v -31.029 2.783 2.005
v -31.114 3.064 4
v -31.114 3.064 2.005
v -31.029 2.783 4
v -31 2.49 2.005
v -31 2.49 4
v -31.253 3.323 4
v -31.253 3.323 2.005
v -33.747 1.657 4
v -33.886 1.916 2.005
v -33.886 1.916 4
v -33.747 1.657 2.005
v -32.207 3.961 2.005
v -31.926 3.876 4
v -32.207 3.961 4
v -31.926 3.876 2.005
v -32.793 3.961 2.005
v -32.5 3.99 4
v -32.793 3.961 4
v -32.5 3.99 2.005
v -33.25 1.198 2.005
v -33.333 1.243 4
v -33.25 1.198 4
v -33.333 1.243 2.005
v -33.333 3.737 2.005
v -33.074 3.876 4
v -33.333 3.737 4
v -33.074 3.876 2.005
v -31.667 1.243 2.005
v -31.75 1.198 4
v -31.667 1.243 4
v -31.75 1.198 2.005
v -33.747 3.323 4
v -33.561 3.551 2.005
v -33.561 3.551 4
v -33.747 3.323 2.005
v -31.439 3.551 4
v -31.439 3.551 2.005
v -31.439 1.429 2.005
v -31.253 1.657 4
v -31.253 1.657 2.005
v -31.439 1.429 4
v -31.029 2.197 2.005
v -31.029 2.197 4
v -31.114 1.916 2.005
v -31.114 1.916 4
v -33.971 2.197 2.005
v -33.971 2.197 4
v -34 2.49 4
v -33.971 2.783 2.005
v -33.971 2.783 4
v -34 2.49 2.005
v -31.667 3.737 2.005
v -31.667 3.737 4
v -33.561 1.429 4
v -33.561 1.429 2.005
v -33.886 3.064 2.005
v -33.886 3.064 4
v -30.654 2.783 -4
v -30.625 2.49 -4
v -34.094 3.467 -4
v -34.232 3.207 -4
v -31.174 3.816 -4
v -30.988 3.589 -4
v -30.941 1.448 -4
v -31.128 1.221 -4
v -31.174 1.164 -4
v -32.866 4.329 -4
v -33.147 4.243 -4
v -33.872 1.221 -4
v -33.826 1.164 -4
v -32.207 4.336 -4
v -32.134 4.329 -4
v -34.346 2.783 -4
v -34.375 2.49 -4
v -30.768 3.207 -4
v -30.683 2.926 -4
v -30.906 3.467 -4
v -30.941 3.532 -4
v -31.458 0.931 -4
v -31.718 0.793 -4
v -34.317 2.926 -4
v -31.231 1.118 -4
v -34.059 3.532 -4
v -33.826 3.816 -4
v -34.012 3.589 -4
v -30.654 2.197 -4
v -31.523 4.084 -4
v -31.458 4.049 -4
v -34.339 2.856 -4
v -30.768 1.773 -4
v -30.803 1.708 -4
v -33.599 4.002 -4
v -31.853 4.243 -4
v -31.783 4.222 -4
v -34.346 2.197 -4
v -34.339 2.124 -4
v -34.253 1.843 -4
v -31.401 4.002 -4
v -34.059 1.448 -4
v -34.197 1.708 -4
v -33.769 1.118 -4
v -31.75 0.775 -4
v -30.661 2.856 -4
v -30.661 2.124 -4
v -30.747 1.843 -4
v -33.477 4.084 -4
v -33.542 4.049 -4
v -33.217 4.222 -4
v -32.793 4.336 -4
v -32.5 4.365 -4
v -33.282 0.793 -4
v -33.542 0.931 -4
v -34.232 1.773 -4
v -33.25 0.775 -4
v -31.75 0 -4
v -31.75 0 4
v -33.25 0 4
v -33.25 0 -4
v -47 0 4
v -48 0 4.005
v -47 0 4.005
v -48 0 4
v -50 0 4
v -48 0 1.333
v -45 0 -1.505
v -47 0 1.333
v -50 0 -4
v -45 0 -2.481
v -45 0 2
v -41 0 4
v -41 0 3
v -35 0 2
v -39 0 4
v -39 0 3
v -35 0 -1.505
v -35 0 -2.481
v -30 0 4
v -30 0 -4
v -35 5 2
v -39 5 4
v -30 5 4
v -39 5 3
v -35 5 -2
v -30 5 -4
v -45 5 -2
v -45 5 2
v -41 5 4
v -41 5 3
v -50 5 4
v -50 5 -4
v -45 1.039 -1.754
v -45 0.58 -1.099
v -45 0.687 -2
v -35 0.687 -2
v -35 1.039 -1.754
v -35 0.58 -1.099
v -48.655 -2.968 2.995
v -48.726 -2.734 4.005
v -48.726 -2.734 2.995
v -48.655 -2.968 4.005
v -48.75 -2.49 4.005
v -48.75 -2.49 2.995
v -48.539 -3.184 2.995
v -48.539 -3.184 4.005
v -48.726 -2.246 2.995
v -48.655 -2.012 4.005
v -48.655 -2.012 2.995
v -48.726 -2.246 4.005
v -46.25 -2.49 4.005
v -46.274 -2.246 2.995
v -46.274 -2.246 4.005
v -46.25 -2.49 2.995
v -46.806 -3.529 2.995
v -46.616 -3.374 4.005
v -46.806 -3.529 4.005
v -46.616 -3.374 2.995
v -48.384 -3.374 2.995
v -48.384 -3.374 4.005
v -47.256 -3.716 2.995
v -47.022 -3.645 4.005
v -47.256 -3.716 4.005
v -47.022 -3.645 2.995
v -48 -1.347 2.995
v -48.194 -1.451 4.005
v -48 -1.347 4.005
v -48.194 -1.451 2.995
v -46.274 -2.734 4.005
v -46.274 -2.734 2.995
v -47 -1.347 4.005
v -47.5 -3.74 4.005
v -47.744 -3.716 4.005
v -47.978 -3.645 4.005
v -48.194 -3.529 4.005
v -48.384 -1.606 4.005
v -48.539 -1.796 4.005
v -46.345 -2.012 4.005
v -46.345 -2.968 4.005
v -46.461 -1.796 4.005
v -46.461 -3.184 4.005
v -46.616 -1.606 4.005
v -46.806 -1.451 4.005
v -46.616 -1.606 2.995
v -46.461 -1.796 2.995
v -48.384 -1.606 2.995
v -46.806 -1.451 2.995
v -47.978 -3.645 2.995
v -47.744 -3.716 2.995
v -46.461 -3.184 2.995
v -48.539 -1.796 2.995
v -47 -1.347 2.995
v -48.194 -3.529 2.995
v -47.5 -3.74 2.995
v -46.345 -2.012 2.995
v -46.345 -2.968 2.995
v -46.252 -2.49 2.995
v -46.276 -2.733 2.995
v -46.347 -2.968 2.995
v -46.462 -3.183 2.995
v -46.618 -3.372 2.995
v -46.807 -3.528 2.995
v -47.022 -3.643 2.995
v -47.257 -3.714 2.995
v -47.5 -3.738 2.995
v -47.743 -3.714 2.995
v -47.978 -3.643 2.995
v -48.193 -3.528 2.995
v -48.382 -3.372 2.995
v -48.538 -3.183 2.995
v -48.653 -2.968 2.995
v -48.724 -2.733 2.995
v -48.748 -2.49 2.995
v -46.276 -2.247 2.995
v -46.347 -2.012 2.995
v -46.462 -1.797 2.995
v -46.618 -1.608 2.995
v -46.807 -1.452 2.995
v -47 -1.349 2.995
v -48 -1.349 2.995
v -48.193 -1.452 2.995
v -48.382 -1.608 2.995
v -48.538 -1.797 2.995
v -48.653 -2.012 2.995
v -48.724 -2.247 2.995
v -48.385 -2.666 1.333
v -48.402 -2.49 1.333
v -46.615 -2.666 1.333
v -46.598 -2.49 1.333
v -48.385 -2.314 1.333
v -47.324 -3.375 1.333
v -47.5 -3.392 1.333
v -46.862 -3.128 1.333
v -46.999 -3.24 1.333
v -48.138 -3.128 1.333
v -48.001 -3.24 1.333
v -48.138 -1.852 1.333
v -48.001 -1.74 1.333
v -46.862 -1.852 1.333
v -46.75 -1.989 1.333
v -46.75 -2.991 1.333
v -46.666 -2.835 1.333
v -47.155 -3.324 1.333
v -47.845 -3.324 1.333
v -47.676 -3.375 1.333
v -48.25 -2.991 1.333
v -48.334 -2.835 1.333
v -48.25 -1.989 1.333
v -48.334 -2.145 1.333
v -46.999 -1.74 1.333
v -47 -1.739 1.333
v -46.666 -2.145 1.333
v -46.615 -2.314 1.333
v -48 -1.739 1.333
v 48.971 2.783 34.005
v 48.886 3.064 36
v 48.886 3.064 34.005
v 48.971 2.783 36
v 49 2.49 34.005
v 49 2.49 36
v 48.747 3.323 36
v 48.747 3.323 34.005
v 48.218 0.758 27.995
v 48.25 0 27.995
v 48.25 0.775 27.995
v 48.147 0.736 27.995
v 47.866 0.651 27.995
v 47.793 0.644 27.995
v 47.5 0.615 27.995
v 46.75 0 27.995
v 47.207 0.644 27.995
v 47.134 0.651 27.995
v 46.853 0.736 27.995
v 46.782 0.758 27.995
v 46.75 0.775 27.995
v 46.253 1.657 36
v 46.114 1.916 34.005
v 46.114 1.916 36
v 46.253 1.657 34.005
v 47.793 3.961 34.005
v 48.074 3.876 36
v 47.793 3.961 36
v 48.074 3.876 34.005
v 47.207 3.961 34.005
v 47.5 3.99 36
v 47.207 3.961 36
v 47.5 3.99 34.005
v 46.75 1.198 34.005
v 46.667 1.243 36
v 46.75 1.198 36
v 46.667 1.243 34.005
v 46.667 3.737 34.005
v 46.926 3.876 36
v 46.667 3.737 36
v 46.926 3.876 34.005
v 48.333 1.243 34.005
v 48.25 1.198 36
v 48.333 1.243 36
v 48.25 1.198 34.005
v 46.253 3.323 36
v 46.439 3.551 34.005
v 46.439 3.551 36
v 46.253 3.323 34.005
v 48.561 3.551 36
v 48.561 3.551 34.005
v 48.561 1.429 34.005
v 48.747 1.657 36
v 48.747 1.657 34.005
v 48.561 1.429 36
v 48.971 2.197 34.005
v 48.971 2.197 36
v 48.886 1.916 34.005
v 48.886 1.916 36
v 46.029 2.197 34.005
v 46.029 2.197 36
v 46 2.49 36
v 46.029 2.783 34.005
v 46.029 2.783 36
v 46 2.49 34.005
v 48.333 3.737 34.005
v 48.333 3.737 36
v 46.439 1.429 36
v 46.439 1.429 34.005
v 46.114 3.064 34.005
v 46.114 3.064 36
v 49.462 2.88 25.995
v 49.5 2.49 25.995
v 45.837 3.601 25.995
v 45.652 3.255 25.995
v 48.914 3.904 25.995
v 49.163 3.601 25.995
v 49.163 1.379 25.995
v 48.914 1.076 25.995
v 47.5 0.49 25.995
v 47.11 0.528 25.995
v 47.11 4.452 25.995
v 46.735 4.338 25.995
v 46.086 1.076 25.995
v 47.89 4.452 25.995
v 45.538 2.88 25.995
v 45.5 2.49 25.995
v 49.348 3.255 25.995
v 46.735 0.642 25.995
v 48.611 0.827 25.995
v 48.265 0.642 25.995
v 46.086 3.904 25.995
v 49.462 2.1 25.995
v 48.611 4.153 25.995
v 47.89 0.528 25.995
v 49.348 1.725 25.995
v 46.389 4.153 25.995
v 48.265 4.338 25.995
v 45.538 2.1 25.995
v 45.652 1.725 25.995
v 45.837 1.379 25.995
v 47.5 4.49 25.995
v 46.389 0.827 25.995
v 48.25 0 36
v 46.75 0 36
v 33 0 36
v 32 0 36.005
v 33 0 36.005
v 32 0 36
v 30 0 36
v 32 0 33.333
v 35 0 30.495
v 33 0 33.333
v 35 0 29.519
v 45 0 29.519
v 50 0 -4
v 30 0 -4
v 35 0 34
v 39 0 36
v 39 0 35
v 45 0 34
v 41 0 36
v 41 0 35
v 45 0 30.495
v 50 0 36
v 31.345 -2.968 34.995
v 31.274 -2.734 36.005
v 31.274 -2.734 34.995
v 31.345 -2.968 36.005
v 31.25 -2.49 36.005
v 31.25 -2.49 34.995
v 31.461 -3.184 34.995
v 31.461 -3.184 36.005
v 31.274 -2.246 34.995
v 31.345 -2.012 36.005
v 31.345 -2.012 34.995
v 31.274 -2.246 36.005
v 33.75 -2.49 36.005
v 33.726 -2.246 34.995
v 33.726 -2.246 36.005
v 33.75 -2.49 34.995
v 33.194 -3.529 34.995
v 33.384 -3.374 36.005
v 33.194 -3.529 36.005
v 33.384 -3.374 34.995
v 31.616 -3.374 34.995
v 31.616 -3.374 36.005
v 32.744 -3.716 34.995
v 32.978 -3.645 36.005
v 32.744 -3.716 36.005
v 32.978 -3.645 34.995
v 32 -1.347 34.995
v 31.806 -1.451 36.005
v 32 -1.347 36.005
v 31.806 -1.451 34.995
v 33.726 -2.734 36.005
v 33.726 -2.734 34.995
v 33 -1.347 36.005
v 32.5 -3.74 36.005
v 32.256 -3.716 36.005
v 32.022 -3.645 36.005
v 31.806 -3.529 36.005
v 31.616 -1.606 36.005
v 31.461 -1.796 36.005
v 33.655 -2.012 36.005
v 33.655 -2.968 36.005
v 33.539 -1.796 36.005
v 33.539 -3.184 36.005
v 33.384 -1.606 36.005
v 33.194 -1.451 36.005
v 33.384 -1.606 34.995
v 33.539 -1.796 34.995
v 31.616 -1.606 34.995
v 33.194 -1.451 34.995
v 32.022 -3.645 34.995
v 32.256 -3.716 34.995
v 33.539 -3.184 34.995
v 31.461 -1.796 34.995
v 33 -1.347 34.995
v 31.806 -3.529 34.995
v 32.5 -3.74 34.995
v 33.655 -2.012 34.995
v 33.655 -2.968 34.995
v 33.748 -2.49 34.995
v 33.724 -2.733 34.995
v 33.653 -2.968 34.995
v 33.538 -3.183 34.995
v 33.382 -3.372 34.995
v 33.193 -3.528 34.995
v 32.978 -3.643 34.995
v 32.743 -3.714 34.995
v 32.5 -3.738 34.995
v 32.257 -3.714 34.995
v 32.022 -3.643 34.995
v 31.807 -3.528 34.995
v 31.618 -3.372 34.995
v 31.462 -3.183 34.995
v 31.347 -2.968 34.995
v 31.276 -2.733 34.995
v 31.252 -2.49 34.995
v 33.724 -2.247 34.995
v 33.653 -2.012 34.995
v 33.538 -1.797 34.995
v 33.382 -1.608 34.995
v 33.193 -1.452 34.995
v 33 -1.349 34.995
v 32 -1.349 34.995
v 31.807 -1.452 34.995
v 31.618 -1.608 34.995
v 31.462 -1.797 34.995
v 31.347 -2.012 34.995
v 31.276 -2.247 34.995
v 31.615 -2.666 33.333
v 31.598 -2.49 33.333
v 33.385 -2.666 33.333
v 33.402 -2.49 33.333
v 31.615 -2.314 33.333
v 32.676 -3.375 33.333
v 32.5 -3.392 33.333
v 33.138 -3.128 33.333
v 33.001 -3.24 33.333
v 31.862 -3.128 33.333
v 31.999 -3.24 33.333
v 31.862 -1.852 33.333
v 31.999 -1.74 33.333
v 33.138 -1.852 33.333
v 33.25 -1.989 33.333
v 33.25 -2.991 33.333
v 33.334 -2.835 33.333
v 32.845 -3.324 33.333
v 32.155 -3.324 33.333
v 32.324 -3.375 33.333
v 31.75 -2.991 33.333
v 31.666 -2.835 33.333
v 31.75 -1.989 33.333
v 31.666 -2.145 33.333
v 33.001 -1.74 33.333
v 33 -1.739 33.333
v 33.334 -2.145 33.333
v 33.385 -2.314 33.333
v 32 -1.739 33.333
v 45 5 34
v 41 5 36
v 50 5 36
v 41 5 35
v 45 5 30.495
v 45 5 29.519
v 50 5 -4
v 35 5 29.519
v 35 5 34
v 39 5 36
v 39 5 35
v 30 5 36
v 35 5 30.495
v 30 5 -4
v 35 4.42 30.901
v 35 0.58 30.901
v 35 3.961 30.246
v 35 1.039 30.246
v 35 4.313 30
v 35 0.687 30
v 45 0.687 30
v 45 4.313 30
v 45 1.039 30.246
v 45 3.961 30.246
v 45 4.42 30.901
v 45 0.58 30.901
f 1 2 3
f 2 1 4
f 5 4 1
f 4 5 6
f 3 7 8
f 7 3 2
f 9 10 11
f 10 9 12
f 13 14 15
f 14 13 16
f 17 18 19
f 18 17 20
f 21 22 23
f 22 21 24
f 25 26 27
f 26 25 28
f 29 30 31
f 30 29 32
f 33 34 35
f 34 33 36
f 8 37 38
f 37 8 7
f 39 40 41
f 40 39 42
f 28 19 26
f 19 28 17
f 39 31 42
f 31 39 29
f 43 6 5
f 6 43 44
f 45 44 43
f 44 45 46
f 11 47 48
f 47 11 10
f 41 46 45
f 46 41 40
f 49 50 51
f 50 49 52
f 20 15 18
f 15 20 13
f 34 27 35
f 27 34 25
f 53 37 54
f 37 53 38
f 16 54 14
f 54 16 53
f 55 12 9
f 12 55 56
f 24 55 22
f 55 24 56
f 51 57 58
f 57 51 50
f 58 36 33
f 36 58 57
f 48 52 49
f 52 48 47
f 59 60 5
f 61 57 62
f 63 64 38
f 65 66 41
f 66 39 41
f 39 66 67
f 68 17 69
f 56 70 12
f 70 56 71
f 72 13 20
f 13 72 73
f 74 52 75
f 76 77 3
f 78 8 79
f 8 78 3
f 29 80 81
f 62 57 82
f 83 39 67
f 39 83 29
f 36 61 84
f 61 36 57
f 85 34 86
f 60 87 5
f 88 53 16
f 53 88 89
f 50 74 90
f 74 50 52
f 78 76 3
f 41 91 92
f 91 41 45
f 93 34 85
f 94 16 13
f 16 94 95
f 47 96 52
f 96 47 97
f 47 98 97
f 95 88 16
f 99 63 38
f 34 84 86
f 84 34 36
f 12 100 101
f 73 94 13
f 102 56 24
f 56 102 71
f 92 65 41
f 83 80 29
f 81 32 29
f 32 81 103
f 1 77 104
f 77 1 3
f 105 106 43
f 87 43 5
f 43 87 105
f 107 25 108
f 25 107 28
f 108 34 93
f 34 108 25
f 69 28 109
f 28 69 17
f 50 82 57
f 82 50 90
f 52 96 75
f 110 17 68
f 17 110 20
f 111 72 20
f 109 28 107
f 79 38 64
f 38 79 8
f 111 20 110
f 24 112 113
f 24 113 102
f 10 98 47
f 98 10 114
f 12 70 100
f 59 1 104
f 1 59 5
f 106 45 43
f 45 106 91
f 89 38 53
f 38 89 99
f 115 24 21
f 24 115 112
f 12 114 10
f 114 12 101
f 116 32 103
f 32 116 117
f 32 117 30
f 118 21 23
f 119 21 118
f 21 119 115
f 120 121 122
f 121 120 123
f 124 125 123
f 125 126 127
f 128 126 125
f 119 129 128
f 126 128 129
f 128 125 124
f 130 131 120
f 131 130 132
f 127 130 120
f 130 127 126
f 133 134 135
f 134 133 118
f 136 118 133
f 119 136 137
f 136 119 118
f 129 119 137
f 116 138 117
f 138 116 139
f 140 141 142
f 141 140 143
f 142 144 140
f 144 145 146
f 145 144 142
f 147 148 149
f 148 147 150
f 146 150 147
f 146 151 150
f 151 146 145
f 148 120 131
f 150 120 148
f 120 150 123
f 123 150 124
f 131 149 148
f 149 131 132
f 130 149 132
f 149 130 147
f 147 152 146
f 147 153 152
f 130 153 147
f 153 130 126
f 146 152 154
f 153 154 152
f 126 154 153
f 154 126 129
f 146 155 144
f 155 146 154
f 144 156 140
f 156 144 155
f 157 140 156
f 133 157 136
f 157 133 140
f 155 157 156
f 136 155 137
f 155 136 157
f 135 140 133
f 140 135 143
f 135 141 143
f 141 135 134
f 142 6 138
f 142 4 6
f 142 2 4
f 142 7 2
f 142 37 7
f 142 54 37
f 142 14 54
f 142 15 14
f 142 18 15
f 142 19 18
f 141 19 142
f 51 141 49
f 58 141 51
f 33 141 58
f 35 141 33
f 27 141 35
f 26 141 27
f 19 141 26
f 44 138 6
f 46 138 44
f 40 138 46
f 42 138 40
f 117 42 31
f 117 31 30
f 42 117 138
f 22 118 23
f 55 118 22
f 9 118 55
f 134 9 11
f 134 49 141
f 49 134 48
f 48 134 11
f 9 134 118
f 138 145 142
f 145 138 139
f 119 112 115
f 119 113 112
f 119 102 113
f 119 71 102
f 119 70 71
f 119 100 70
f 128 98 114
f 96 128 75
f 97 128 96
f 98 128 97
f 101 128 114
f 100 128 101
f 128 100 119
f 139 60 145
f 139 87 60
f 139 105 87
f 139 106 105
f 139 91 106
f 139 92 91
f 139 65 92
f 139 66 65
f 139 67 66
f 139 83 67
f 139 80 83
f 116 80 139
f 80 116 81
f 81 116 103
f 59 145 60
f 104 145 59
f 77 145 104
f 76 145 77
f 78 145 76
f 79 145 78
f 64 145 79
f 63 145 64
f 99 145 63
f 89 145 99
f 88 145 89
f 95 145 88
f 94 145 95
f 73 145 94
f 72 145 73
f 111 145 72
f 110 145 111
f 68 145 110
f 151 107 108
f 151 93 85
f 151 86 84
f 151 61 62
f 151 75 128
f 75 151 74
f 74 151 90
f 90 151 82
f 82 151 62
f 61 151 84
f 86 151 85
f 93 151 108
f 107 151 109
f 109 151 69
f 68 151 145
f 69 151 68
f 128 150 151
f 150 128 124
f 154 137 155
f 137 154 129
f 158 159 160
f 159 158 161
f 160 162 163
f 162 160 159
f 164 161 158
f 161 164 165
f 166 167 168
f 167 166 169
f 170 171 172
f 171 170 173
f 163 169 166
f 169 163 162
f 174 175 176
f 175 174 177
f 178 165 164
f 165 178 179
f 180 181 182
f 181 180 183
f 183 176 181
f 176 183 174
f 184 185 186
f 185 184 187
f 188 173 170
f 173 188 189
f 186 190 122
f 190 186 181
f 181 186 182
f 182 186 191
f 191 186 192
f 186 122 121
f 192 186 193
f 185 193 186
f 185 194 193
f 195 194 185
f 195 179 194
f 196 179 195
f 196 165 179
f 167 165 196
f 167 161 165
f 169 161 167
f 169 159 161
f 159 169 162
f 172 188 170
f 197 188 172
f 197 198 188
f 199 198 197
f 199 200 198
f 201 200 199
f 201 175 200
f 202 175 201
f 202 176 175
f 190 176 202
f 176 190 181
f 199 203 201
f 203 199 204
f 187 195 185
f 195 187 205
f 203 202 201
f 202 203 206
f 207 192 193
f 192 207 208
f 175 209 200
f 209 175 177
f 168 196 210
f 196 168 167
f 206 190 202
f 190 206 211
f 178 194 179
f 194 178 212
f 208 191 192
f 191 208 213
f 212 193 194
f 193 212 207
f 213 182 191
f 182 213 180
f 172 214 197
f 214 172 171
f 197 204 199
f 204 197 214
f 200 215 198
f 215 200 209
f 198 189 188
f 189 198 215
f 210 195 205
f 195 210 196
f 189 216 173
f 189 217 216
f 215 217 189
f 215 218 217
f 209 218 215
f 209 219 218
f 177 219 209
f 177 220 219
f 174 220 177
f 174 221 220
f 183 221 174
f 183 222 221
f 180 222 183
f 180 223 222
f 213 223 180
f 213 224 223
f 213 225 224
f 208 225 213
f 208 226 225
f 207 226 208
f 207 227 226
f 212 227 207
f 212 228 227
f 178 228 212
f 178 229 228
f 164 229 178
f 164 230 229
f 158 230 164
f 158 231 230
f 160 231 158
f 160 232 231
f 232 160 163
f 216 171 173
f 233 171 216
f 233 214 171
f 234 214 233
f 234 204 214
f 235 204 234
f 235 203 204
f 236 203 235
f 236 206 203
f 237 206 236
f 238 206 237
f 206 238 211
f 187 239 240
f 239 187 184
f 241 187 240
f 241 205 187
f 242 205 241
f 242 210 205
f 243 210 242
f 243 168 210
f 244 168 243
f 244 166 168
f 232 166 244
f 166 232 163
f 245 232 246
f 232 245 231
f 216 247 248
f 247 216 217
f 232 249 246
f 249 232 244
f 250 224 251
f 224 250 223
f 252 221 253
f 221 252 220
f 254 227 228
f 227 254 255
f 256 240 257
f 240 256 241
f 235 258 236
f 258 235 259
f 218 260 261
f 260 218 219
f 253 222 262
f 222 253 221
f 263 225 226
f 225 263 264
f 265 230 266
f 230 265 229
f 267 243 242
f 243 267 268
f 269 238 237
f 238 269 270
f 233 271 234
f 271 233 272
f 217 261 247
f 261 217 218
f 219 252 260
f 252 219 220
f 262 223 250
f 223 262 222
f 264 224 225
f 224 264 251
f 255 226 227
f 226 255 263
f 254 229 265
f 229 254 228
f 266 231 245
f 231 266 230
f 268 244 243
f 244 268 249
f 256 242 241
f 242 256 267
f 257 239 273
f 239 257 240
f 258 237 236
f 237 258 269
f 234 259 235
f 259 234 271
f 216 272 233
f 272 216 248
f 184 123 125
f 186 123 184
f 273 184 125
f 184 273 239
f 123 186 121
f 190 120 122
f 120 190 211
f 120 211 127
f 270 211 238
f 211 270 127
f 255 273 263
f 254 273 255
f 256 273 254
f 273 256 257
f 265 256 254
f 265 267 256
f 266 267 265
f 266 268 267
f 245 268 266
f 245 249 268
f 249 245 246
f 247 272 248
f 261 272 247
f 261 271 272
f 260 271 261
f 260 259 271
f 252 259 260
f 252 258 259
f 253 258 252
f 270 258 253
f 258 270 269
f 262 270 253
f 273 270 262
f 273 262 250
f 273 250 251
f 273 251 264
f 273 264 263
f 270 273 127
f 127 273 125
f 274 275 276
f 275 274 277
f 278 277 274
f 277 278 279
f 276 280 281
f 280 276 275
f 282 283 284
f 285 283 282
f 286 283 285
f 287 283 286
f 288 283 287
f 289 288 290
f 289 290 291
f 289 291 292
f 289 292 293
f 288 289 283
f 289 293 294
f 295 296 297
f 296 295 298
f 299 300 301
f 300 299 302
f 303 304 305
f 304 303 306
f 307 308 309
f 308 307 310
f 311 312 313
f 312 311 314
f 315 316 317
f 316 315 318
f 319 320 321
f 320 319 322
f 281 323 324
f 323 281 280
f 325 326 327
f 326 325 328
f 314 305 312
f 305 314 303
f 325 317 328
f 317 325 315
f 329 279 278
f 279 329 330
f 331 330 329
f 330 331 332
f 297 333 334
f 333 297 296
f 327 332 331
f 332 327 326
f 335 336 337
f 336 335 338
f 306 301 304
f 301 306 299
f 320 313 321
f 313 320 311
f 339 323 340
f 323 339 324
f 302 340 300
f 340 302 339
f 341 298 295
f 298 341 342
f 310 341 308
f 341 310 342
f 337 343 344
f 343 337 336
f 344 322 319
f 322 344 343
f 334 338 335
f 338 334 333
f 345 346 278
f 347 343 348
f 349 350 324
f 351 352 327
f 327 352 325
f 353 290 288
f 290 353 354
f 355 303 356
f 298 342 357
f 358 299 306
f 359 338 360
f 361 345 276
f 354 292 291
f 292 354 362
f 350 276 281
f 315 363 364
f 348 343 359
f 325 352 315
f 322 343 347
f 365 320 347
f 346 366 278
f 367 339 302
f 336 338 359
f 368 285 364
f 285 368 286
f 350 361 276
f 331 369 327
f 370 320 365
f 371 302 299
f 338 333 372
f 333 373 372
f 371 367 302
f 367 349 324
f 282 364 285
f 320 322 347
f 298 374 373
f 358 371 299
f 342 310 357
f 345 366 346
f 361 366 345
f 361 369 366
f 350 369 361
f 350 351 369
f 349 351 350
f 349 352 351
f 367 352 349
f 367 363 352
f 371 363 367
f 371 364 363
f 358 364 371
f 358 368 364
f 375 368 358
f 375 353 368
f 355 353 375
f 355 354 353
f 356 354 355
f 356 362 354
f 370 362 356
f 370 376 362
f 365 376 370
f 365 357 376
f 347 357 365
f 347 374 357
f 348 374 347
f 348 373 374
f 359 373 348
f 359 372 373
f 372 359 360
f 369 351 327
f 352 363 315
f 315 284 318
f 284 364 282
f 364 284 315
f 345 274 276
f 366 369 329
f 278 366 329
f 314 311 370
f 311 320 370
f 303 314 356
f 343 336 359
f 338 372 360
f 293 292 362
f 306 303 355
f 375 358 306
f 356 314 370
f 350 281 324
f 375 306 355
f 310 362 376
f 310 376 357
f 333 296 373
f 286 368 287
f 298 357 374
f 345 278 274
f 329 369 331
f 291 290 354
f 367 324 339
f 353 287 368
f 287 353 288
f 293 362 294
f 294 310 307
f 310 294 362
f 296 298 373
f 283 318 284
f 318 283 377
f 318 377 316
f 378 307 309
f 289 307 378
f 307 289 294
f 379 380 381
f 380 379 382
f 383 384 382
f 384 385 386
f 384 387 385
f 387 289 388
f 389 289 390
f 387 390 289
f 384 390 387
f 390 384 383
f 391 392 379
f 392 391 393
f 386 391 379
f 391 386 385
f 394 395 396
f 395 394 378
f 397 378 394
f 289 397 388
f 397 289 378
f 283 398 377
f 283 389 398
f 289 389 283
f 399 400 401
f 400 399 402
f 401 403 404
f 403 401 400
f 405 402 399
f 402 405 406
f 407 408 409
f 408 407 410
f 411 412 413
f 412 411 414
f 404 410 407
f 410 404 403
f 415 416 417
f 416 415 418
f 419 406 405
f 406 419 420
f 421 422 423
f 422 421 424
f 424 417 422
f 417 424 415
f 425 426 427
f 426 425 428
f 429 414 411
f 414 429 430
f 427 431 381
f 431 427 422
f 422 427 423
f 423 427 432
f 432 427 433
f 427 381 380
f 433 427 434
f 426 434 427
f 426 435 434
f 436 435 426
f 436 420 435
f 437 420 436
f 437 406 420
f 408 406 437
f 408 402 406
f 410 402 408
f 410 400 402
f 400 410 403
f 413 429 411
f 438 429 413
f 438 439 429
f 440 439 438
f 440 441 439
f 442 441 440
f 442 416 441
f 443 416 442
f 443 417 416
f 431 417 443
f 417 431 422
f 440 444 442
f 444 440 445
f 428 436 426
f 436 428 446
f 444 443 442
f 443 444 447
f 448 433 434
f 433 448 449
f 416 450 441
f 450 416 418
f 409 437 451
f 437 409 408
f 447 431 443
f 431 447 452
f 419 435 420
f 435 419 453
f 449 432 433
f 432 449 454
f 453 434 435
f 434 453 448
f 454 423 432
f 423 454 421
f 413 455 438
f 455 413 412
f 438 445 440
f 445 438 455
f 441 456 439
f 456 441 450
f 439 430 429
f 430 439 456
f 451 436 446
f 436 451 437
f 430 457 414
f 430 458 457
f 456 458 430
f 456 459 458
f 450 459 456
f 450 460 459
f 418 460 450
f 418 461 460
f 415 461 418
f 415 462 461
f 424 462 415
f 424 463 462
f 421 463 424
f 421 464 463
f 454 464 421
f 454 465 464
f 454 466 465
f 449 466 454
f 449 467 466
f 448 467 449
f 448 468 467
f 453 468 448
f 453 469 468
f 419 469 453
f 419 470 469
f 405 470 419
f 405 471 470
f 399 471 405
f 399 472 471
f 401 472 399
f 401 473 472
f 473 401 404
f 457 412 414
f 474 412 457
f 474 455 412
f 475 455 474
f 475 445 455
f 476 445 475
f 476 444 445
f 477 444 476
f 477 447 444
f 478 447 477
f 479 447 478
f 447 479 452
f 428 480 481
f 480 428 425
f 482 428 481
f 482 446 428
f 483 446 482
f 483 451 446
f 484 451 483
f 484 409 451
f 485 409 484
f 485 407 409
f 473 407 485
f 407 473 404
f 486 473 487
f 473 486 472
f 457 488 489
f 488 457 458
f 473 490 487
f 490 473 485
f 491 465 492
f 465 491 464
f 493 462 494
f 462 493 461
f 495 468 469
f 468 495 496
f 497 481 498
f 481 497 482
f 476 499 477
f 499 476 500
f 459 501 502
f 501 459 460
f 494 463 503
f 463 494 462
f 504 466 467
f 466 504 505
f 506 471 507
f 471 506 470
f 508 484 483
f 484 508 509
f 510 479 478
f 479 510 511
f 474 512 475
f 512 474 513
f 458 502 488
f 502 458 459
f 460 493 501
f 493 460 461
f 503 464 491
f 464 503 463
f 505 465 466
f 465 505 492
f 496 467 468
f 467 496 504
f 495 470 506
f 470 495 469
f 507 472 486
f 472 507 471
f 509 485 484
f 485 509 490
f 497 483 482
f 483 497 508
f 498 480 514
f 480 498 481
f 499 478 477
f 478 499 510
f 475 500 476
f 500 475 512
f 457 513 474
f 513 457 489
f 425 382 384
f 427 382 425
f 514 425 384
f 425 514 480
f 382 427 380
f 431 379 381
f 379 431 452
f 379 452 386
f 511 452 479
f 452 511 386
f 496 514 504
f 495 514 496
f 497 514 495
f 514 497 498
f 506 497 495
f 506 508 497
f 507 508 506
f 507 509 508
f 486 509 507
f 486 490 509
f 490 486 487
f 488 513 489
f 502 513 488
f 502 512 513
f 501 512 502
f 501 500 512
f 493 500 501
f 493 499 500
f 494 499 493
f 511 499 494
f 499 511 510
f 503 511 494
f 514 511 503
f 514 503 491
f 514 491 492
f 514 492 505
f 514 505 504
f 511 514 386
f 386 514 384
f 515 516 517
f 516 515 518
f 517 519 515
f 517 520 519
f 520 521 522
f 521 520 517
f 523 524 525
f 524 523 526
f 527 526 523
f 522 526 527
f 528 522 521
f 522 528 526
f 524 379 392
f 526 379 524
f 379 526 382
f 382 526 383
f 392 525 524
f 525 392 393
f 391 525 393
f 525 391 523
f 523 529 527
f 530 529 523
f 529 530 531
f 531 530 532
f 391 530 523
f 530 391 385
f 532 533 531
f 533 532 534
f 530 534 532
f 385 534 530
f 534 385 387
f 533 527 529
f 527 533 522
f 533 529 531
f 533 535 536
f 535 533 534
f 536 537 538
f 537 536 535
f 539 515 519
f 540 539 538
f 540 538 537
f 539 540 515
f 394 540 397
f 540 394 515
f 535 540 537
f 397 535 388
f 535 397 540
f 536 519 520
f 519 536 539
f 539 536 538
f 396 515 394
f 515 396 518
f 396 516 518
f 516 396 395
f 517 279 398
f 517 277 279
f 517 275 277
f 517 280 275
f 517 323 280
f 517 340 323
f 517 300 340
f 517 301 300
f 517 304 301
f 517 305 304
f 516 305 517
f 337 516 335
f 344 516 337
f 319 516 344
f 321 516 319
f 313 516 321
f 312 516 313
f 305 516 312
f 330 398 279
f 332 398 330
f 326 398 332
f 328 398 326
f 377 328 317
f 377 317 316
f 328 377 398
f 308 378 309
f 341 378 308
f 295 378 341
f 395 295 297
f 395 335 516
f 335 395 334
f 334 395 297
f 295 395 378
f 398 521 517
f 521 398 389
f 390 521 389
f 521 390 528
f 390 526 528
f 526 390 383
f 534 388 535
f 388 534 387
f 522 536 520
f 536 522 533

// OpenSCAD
include <train_tube_track.scad>;


ttt_curved180m_ramp_3();

//platform();
